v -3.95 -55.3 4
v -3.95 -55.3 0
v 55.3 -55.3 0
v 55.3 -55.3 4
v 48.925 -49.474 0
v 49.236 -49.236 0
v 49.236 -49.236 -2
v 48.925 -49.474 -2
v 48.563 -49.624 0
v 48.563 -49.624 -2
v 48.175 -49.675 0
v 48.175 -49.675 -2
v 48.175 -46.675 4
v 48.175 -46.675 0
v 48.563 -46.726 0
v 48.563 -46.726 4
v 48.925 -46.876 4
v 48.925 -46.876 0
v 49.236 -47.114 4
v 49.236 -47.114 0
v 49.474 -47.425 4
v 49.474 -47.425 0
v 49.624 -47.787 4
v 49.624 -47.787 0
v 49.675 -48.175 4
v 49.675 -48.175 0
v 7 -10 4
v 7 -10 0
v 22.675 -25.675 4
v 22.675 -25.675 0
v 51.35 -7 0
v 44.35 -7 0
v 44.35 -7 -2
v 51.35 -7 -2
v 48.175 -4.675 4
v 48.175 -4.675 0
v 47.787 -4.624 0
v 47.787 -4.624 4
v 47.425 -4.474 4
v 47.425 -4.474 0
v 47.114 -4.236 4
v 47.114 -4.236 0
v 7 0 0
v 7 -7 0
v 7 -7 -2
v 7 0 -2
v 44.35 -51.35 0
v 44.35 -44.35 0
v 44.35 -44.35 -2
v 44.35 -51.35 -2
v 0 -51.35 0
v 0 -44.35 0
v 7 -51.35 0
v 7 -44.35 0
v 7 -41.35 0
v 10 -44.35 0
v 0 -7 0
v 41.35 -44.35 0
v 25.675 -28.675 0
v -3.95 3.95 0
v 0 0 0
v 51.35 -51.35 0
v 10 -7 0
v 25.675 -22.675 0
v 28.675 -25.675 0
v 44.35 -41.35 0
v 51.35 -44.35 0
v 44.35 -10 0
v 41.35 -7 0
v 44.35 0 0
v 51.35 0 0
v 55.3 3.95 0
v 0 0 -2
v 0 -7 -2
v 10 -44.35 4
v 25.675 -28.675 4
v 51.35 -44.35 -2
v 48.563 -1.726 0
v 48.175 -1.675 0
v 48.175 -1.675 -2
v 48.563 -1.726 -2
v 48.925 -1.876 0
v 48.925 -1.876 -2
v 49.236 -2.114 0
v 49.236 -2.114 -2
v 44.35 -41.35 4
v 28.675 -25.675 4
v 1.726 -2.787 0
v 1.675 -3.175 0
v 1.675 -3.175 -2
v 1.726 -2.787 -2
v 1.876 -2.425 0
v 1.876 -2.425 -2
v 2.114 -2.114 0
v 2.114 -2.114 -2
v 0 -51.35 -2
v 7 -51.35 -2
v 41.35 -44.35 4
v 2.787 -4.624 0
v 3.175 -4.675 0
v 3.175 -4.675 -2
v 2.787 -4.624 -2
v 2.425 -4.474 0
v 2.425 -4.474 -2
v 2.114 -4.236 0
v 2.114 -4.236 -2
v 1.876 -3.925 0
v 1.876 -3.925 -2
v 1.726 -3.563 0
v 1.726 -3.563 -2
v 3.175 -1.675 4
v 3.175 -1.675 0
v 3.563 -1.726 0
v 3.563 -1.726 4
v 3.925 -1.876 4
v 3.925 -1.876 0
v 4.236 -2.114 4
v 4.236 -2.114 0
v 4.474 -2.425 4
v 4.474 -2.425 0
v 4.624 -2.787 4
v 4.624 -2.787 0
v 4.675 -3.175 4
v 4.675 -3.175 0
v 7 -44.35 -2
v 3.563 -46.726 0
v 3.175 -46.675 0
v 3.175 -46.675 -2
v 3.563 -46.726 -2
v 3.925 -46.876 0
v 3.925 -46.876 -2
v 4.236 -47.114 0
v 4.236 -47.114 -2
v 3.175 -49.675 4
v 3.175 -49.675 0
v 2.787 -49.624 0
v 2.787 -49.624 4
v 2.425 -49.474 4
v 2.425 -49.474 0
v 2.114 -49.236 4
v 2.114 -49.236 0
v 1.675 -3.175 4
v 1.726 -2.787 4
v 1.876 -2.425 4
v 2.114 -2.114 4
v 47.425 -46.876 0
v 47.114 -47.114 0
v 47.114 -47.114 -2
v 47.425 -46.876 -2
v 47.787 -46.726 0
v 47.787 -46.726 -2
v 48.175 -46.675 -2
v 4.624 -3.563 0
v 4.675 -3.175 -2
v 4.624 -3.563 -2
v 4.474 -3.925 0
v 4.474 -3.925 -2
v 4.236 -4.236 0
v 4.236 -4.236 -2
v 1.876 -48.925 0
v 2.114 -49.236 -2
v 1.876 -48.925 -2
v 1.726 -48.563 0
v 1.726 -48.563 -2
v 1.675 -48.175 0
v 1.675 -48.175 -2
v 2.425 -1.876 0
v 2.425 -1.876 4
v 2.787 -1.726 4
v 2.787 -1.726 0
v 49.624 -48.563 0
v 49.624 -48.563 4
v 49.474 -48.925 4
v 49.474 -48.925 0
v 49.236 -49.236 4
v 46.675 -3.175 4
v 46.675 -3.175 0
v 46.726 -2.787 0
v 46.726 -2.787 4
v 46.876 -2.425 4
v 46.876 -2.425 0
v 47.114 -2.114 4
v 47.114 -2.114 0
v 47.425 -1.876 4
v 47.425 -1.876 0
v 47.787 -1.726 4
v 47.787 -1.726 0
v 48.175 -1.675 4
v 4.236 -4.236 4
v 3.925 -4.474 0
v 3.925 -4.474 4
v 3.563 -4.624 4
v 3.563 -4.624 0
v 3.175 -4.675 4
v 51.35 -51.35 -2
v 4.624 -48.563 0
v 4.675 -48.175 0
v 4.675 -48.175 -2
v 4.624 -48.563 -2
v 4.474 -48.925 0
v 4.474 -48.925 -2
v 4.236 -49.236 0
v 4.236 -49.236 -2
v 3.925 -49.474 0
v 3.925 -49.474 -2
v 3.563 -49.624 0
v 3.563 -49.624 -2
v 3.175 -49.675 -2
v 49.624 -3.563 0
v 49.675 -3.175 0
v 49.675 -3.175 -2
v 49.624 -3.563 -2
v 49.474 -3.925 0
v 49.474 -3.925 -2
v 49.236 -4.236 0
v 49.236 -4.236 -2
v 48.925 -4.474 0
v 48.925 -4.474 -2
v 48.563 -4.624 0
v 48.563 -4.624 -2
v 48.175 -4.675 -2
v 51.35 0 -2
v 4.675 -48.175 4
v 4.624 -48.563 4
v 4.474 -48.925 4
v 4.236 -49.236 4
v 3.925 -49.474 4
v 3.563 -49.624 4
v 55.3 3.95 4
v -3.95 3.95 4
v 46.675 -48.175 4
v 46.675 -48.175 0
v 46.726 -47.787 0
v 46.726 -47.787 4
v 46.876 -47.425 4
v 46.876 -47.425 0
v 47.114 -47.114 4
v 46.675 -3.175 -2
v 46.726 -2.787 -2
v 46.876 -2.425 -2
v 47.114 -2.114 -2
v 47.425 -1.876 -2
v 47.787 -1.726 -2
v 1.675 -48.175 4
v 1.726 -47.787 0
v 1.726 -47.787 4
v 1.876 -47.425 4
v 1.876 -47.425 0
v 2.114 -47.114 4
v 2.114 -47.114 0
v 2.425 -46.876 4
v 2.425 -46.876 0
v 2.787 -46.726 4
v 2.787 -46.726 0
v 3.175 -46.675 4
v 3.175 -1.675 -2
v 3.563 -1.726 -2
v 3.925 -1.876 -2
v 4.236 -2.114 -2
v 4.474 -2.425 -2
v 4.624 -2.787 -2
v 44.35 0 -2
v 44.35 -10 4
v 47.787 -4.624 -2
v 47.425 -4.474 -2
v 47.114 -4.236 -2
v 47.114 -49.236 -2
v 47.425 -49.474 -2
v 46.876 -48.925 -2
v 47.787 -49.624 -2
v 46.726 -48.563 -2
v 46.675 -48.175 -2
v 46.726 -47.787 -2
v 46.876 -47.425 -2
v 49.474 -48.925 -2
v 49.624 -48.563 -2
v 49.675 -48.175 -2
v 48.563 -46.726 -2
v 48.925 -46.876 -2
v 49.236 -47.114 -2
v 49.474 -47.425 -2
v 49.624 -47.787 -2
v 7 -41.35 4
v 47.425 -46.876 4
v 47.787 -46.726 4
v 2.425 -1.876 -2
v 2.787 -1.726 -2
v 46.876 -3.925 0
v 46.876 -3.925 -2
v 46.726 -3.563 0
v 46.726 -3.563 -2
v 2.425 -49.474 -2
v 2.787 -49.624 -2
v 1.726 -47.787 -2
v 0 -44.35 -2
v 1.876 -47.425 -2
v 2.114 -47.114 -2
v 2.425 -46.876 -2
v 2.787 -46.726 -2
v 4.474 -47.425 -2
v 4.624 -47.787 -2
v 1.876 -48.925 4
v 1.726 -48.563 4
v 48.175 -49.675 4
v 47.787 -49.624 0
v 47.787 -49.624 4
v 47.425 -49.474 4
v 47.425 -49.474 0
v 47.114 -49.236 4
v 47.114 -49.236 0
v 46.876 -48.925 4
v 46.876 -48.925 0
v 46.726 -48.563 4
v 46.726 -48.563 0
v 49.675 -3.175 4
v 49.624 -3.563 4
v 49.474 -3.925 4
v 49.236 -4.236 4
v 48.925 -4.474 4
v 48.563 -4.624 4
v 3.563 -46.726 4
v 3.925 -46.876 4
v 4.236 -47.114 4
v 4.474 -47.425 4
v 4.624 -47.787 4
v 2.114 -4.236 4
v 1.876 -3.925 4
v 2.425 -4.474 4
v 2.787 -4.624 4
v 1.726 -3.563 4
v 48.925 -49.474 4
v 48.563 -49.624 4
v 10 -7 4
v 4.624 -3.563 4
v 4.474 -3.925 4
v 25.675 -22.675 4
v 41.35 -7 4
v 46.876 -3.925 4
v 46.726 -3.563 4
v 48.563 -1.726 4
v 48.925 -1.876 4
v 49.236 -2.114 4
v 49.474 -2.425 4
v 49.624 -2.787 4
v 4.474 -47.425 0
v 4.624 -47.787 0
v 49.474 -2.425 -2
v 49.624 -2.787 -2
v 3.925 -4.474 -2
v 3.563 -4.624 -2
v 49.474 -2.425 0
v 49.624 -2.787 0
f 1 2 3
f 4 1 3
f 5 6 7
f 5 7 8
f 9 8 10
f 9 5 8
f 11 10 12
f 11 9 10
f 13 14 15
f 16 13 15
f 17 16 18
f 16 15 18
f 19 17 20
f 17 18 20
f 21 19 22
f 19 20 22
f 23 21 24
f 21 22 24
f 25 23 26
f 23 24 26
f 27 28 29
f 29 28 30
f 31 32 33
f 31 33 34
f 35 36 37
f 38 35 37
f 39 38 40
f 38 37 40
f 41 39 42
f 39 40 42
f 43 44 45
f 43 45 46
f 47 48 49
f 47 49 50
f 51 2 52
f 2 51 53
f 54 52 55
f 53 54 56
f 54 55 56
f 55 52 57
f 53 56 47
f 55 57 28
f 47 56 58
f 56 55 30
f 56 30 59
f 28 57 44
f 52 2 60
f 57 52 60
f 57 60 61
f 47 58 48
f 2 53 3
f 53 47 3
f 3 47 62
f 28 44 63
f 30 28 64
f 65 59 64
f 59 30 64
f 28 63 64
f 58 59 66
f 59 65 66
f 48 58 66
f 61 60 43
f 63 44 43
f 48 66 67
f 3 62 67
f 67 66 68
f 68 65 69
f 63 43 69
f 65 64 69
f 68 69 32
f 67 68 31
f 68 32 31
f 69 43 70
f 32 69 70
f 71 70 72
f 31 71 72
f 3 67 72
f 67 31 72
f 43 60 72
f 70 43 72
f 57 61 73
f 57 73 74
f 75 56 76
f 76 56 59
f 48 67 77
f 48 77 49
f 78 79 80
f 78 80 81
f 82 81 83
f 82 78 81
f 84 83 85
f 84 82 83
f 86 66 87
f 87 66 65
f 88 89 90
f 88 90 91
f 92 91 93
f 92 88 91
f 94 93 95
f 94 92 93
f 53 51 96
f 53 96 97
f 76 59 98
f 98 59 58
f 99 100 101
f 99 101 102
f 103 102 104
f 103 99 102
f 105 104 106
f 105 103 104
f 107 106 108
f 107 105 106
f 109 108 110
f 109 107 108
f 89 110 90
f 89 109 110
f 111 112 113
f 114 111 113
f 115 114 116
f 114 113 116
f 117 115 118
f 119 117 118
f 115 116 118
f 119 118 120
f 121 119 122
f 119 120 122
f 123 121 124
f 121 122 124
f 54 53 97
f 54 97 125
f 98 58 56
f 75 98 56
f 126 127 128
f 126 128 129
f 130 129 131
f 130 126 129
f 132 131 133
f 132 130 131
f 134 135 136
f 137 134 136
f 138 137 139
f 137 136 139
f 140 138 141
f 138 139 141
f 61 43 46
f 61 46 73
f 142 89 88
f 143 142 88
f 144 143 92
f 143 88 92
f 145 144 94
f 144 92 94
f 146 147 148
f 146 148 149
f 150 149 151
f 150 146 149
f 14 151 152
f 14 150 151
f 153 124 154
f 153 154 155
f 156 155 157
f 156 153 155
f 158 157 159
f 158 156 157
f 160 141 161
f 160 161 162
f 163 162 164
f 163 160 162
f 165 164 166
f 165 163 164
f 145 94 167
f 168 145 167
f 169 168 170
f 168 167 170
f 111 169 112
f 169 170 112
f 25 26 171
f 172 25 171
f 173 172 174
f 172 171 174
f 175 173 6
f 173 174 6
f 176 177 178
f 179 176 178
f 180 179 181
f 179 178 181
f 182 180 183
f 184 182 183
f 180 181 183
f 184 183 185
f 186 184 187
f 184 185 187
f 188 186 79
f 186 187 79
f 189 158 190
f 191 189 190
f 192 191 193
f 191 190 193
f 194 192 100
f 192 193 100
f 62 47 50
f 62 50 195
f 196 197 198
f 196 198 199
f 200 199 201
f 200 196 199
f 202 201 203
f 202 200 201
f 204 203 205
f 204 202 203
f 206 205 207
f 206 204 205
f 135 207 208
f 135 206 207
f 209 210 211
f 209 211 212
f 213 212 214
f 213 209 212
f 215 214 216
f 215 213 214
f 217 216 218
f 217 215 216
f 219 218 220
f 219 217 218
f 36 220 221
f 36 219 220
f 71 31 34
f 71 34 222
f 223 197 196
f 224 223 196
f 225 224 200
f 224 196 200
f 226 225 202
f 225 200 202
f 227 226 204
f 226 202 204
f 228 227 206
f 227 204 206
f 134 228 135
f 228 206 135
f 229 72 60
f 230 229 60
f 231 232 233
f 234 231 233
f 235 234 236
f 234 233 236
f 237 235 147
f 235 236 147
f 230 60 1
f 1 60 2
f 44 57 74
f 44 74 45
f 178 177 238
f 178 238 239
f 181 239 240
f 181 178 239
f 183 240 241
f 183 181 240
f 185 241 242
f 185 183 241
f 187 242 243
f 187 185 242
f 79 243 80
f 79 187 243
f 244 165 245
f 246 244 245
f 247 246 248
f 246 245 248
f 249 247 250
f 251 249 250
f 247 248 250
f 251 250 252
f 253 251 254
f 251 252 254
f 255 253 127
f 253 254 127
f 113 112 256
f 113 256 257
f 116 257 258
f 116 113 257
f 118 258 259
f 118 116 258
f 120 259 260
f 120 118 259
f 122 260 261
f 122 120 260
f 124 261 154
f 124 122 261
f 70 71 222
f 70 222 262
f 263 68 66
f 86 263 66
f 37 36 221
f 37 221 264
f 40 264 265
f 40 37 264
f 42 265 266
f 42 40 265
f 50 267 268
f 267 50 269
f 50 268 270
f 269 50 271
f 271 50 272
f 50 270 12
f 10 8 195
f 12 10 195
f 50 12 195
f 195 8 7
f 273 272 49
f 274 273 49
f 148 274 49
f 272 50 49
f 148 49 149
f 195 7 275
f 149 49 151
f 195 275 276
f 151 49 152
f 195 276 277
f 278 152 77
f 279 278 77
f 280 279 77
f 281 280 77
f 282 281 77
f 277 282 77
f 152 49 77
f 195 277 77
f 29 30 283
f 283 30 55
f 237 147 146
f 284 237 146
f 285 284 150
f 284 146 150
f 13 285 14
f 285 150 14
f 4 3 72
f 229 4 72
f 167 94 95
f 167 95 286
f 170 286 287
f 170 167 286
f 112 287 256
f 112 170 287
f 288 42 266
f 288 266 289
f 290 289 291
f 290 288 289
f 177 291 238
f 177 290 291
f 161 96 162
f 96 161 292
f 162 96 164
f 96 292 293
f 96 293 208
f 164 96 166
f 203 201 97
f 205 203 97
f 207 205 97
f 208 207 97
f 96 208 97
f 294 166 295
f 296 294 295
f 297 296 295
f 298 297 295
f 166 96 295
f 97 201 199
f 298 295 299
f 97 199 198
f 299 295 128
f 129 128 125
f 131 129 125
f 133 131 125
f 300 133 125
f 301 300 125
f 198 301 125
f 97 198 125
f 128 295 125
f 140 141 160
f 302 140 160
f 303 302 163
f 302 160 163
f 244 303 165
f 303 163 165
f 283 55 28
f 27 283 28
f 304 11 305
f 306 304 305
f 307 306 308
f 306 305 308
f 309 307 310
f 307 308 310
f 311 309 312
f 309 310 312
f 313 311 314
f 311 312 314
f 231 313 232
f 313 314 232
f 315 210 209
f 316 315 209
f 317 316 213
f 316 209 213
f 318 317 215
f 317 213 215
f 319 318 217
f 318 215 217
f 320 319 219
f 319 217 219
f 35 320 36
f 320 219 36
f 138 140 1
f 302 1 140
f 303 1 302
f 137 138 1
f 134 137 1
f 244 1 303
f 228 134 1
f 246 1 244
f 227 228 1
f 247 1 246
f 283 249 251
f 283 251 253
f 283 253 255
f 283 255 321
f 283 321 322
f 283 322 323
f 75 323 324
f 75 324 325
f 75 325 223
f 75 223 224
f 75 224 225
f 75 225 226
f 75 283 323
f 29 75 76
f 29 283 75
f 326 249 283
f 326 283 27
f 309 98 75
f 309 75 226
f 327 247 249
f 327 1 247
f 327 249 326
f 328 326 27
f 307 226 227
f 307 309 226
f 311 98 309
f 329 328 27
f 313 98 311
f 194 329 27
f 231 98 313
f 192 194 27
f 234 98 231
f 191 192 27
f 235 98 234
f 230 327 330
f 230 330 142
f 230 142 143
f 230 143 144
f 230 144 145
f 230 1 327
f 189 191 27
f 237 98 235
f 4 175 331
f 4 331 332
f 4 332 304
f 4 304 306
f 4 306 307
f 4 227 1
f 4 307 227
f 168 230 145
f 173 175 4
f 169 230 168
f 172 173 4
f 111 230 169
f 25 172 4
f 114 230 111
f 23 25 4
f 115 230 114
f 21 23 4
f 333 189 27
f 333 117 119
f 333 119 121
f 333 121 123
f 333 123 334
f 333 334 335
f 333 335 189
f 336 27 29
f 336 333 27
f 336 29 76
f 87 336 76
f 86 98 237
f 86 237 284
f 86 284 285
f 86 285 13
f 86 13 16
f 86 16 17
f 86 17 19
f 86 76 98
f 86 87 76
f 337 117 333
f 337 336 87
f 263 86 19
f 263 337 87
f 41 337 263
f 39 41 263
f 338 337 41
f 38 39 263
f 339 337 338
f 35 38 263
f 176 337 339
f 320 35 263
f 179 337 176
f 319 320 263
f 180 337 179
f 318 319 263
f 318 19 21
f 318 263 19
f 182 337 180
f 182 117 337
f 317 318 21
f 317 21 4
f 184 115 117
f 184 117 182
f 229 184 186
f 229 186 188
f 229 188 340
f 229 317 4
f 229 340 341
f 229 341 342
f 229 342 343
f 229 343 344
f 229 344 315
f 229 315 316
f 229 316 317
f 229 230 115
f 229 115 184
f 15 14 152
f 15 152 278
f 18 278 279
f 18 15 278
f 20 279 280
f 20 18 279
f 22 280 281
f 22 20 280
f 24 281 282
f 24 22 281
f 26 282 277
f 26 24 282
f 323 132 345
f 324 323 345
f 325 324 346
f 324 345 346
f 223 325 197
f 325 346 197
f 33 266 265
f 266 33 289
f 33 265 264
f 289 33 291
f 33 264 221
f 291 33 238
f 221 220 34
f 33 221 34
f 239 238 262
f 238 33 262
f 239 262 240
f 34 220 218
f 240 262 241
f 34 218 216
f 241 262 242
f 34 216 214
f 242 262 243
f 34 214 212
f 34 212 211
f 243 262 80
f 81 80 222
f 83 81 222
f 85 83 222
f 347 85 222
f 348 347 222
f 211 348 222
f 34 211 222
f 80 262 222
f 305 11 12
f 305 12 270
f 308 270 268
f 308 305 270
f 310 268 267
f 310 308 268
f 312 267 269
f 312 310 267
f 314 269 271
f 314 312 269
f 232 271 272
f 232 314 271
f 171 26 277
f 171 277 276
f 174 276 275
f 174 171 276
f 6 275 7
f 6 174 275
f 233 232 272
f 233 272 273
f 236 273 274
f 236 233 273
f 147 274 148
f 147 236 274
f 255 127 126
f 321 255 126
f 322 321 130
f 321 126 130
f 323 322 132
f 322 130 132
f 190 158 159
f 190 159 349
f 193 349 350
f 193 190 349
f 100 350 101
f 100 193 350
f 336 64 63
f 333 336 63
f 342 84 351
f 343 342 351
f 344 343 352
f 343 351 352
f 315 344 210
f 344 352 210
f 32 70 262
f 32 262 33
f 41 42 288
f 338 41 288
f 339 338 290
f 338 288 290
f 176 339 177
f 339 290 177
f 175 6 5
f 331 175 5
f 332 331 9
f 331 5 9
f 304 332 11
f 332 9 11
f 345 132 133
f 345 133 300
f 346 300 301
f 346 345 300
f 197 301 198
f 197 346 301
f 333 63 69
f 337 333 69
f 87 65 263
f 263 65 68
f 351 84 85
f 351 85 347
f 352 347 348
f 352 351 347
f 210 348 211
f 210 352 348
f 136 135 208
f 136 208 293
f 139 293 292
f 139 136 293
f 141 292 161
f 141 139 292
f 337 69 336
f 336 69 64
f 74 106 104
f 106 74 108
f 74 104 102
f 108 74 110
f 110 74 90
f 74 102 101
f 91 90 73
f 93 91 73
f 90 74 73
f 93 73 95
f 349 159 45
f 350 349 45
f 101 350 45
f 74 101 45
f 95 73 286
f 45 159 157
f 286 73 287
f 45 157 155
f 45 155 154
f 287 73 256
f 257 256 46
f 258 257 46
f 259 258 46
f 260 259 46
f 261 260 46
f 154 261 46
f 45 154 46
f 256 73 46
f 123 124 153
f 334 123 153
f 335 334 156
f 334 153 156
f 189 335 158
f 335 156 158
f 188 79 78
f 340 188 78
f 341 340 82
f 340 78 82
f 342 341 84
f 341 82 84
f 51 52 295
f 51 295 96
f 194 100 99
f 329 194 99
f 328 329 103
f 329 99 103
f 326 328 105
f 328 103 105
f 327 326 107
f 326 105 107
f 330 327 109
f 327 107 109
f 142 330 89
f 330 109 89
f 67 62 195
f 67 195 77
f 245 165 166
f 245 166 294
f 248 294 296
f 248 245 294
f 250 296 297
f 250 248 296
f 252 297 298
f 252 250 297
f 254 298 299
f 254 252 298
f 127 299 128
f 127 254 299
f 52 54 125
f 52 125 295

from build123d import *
from build123d import SkipClean  # not in build123d's __all__

# Parameters (mm, degrees)
F0_W     = 3.175
F0_H     = 37.35
F0_W_2   = 37.35
F0_H_2   = 3.175
F1_DEPTH = 4
F2_DEPTH = 2


# Not quite as in the source:
# - a feature names something its author has since deleted; it is built from what else it names


with BuildPart() as f1:
    # F0 (on Top) → F1 (new body)
    with BuildSketch(Plane.XY):
        Polygon((0, -51.35), (-3.95, -55.3), (55.3, -55.3), (51.35, -51.35), (48.175, -51.35), (44.35, -51.35), (7, -51.35), (3.175, -51.35), align=None)
        with Locations((1.5875, -25.675)):
            Rectangle(F0_W, F0_H)
        with Locations((25.675, -49.7625)):
            Rectangle(F0_W_2, F0_H_2)
        with BuildLine():
            Line((3.175, -44.35), (0, -44.35))
            Line((0, -44.35), (0, -48.175))
            Line((0, -48.175), (1.675, -48.175))
            ThreePointArc((1.675, -48.175), (2.1143398282, -47.1143398282), (3.175, -46.675))
            Line((3.175, -46.675), (3.175, -44.35))
        make_face()
        with BuildLine():
            Line((7, -44.35), (3.175, -44.35))
            Line((3.175, -44.35), (3.175, -46.675))
            ThreePointArc((3.175, -46.675), (3.7490251485, -46.7891807012), (4.2356601718, -47.1143398282))
            Line((4.2356601718, -47.1143398282), (7, -44.35))
        make_face()
        with BuildLine():
            Line((2.1143398282, -49.2356601718), (0, -51.35))
            Line((0, -51.35), (3.175, -51.35))
            Line((3.175, -51.35), (3.175, -49.675))
            ThreePointArc((3.175, -49.675), (2.6009748515, -49.5608192988), (2.1143398282, -49.2356601718))
        make_face()
        Polygon((0, -3.175), (0, 0), (-3.95, 3.95), (-3.95, -55.3), (0, -51.35), (0, -48.175), (0, -44.35), (0, -7), align=None)
        Polygon((-3.95, 3.95), (0, 0), (3.175, 0), (7, 0), (44.35, 0), (48.175, 0), (51.35, 0), (55.3, 3.95), align=None)
        with Locations((25.675, -1.5875)):
            Rectangle(F0_W_2, F0_H_2)
        Polygon((55.3, -55.3), (55.3, 3.95), (51.35, 0), (51.35, -3.175), (51.35, -7), (51.35, -44.35), (51.35, -48.175), (51.35, -51.35), align=None)
        with Locations((49.7625, -25.675)):
            Rectangle(F0_W, F0_H)
        with BuildLine():
            Line((49.2356601718, -49.2356601718), (51.35, -51.35))
            Line((51.35, -51.35), (51.35, -48.175))
            Line((51.35, -48.175), (49.675, -48.175))
            ThreePointArc((49.675, -48.175), (49.5608192988, -48.7490251485), (49.2356601718, -49.2356601718))
        make_face()
        with BuildLine():
            Line((49.675, -48.175), (51.35, -48.175))
            Line((51.35, -48.175), (51.35, -44.35))
            Line((51.35, -44.35), (48.175, -44.35))
            Line((48.175, -44.35), (48.175, -46.675))
            ThreePointArc((48.175, -46.675), (49.2356601718, -47.1143398282), (49.675, -48.175))
        make_face()
        with BuildLine():
            Line((48.175, -46.675), (48.175, -44.35))
            Line((48.175, -44.35), (44.35, -44.35))
            Line((44.35, -44.35), (47.1143398282, -47.1143398282))
            ThreePointArc((47.1143398282, -47.1143398282), (47.6009748515, -46.7891807012), (48.175, -46.675))
        make_face()
        Polygon((7, -41.3499998236), (7, -44.35), (8.5000000882, -42.8499999118), align=None)
        Polygon((8.5000000882, -42.8499999118), (7, -44.35), (10.0000001764, -44.35), align=None)
        Polygon((8.5000000882, -42.8499999118), (10.0000001764, -44.35), (25.6750000882, -28.6750000882), (24.175, -27.175), align=None)
        Polygon((22.6749999118, -25.6749999118), (7, -41.3499998236), (8.5000000882, -42.8499999118), (24.175, -27.175), align=None)
        Polygon((8.5, -8.5), (7, -10), (22.6749999118, -25.6749999118), (24.1749999118, -24.1749999118), align=None)
        Polygon((25.6749999118, -22.6749999118), (10, -7), (8.5, -8.5), (24.1749999118, -24.1749999118), align=None)
        Polygon((27.175, -24.175), (25.6749999118, -22.6749999118), (24.1749999118, -24.1749999118), (25.675, -25.675), align=None)
        Polygon((27.1750000882, -27.1750000882), (28.6750000882, -25.6750000882), (27.175, -24.175), (25.675, -25.675), align=None)
        Polygon((25.675, -25.675), (24.175, -27.175), (25.6750000882, -28.6750000882), (27.1750000882, -27.1750000882), align=None)
        Polygon((24.1749999118, -24.1749999118), (22.6749999118, -25.6749999118), (24.175, -27.175), (25.675, -25.675), align=None)
        Polygon((25.6750000882, -28.6750000882), (41.35, -44.35), (42.85, -42.85), (27.1750000882, -27.1750000882), align=None)
        Polygon((42.85, -42.85), (44.35, -41.35), (28.6750000882, -25.6750000882), (27.1750000882, -27.1750000882), align=None)
        Polygon((8.5, -8.5), (7, -7), (7, -10), align=None)
        Polygon((10, -7), (7, -7), (8.5, -8.5), align=None)
        Polygon((28.6750000882, -25.6750000882), (44.35, -10.0000001764), (42.8499999118, -8.5000000882), (27.175, -24.175), align=None)
        Polygon((42.8499999118, -8.5000000882), (41.3499998236, -7), (25.6749999118, -22.6749999118), (27.175, -24.175), align=None)
        Polygon((44.35, -10.0000001764), (44.35, -7), (42.8499999118, -8.5000000882), align=None)
        Polygon((44.35, -44.35), (44.35, -41.35), (42.85, -42.85), align=None)
        Polygon((42.85, -42.85), (41.35, -44.35), (44.35, -44.35), align=None)
        Polygon((42.8499999118, -8.5000000882), (44.35, -7), (41.3499998236, -7), align=None)
        with BuildLine():
            Line((0, -48.175), (0, -51.35))
            Line((0, -51.35), (2.1143398282, -49.2356601718))
            ThreePointArc((2.1143398282, -49.2356601718), (1.7891807012, -48.7490251485), (1.675, -48.175))
            Line((1.675, -48.175), (0, -48.175))
        make_face()
        with BuildLine():
            Line((3.175, -49.675), (3.175, -51.35))
            Line((3.175, -51.35), (7, -51.35))
            Line((7, -51.35), (7, -48.175))
            Line((7, -48.175), (4.675, -48.175))
            ThreePointArc((4.675, -48.175), (4.2356601718, -49.2356601718), (3.175, -49.675))
        make_face()
        with BuildLine():
            Line((7, -48.175), (7, -44.35))
            Line((7, -44.35), (4.2356601718, -47.1143398282))
            ThreePointArc((4.2356601718, -47.1143398282), (4.5608192988, -47.6009748515), (4.675, -48.175))
            Line((4.675, -48.175), (7, -48.175))
        make_face()
        with BuildLine():
            Line((44.35, -51.35), (48.175, -51.35))
            Line((48.175, -51.35), (48.175, -49.675))
            ThreePointArc((48.175, -49.675), (47.1143398282, -49.2356601718), (46.675, -48.175))
            Line((46.675, -48.175), (44.35, -48.175))
            Line((44.35, -48.175), (44.35, -51.35))
        make_face()
        with BuildLine():
            Line((44.35, -44.35), (44.35, -48.175))
            Line((44.35, -48.175), (46.675, -48.175))
            ThreePointArc((46.675, -48.175), (46.7891807012, -47.6009748515), (47.1143398282, -47.1143398282))
            Line((47.1143398282, -47.1143398282), (44.35, -44.35))
        make_face()
        with BuildLine():
            Line((48.175, -51.35), (51.35, -51.35))
            Line((51.35, -51.35), (49.2356601718, -49.2356601718))
            ThreePointArc((49.2356601718, -49.2356601718), (48.7490251485, -49.5608192988), (48.175, -49.675))
            Line((48.175, -49.675), (48.175, -51.35))
        make_face()
        with BuildLine():
            Line((48.175, 0), (44.35, 0))
            Line((44.35, 0), (44.35, -3.175))
            Line((44.35, -3.175), (46.675, -3.175))
            ThreePointArc((46.675, -3.175), (47.1143398282, -2.1143398282), (48.175, -1.675))
            Line((48.175, -1.675), (48.175, 0))
        make_face()
        with BuildLine():
            Line((46.675, -3.175), (44.35, -3.175))
            Line((44.35, -3.175), (44.35, -7))
            Line((44.35, -7), (47.1143398282, -4.2356601718))
            ThreePointArc((47.1143398282, -4.2356601718), (46.7891807012, -3.7490251485), (46.675, -3.175))
        make_face()
        with BuildLine():
            Line((49.2356601718, -2.1143398282), (51.35, 0))
            Line((51.35, 0), (48.175, 0))
            Line((48.175, 0), (48.175, -1.675))
            ThreePointArc((48.175, -1.675), (48.7490251485, -1.7891807012), (49.2356601718, -2.1143398282))
        make_face()
        with BuildLine():
            Line((7, 0), (3.175, 0))
            Line((3.175, 0), (3.175, -1.675))
            ThreePointArc((3.175, -1.675), (4.2356601718, -2.1143398282), (4.675, -3.175))
            Line((4.675, -3.175), (7, -3.175))
            Line((7, -3.175), (7, 0))
        make_face()
        with BuildLine():
            Line((7, -7), (7, -3.175))
            Line((7, -3.175), (4.675, -3.175))
            ThreePointArc((4.675, -3.175), (4.5608192988, -3.7490251485), (4.2356601718, -4.2356601718))
            Line((4.2356601718, -4.2356601718), (7, -7))
        make_face()
        with BuildLine():
            Line((3.175, -4.675), (3.175, -7))
            Line((3.175, -7), (7, -7))
            Line((7, -7), (4.2356601718, -4.2356601718))
            ThreePointArc((4.2356601718, -4.2356601718), (3.7490251485, -4.5608192988), (3.175, -4.675))
        make_face()
        with BuildLine():
            Line((1.675, -3.175), (0, -3.175))
            Line((0, -3.175), (0, -7))
            Line((0, -7), (3.175, -7))
            Line((3.175, -7), (3.175, -4.675))
            ThreePointArc((3.175, -4.675), (2.1143398282, -4.2356601718), (1.675, -3.175))
        make_face()
        with BuildLine():
            Line((2.1143398282, -2.1143398282), (0, 0))
            Line((0, 0), (0, -3.175))
            Line((0, -3.175), (1.675, -3.175))
            ThreePointArc((1.675, -3.175), (1.7891807012, -2.6009748515), (2.1143398282, -2.1143398282))
        make_face()
        Polygon((44.35, -3.175), (7, -3.175), (7, -7), (10, -7), (41.3499998236, -7), (44.35, -7), align=None)
        Polygon((7, -7), (3.175, -7), (3.175, -44.35), (7, -44.35), (7, -41.3499998236), (7, -10), align=None)
        with BuildLine():
            Line((51.35, -3.175), (51.35, 0))
            Line((51.35, 0), (49.2356601718, -2.1143398282))
            ThreePointArc((49.2356601718, -2.1143398282), (49.5608192988, -2.6009748515), (49.675, -3.175))
            Line((49.675, -3.175), (51.35, -3.175))
        make_face()
        with BuildLine():
            Line((51.35, -7), (51.35, -3.175))
            Line((51.35, -3.175), (49.675, -3.175))
            ThreePointArc((49.675, -3.175), (49.2356601718, -4.2356601718), (48.175, -4.675))
            Line((48.175, -4.675), (48.175, -7))
            Line((48.175, -7), (51.35, -7))
        make_face()
        with BuildLine():
            Line((47.1143398282, -4.2356601718), (44.35, -7))
            Line((44.35, -7), (48.175, -7))
            Line((48.175, -7), (48.175, -4.675))
            ThreePointArc((48.175, -4.675), (47.6009748515, -4.5608192988), (47.1143398282, -4.2356601718))
        make_face()
        Polygon((48.175, -7), (44.35, -7), (44.35, -10.0000001764), (44.35, -41.35), (44.35, -44.35), (48.175, -44.35), align=None)
        Polygon((10.0000001764, -44.35), (7, -44.35), (7, -48.175), (44.35, -48.175), (44.35, -44.35), (41.35, -44.35), align=None)
        with BuildLine():
            Line((3.175, 0), (0, 0))
            Line((0, 0), (2.1143398282, -2.1143398282))
            ThreePointArc((2.1143398282, -2.1143398282), (2.6009748515, -1.7891807012), (3.175, -1.675))
            Line((3.175, -1.675), (3.175, 0))
        make_face()
    extrude(amount=F1_DEPTH)

    # F0 (on Top) → F2 (join)
    with BuildSketch(Plane.XY):
        with BuildLine():
            Line((3.175, -44.35), (0, -44.35))
            Line((0, -44.35), (0, -48.175))
            Line((0, -48.175), (1.675, -48.175))
            ThreePointArc((1.675, -48.175), (2.1143398282, -47.1143398282), (3.175, -46.675))
            Line((3.175, -46.675), (3.175, -44.35))
        make_face()
        with BuildLine():
            Line((7, -44.35), (3.175, -44.35))
            Line((3.175, -44.35), (3.175, -46.675))
            ThreePointArc((3.175, -46.675), (3.7490251485, -46.7891807012), (4.2356601718, -47.1143398282))
            Line((4.2356601718, -47.1143398282), (7, -44.35))
        make_face()
        with BuildLine():
            Line((2.1143398282, -49.2356601718), (0, -51.35))
            Line((0, -51.35), (3.175, -51.35))
            Line((3.175, -51.35), (3.175, -49.675))
            ThreePointArc((3.175, -49.675), (2.6009748515, -49.5608192988), (2.1143398282, -49.2356601718))
        make_face()
        with BuildLine():
            Line((49.675, -48.175), (51.35, -48.175))
            Line((51.35, -48.175), (51.35, -44.35))
            Line((51.35, -44.35), (48.175, -44.35))
            Line((48.175, -44.35), (48.175, -46.675))
            ThreePointArc((48.175, -46.675), (49.2356601718, -47.1143398282), (49.675, -48.175))
        make_face()
        with BuildLine():
            Line((48.175, -46.675), (48.175, -44.35))
            Line((48.175, -44.35), (44.35, -44.35))
            Line((44.35, -44.35), (47.1143398282, -47.1143398282))
            ThreePointArc((47.1143398282, -47.1143398282), (47.6009748515, -46.7891807012), (48.175, -46.675))
        make_face()
        with BuildLine():
            Line((49.2356601718, -49.2356601718), (51.35, -51.35))
            Line((51.35, -51.35), (51.35, -48.175))
            Line((51.35, -48.175), (49.675, -48.175))
            ThreePointArc((49.675, -48.175), (49.5608192988, -48.7490251485), (49.2356601718, -49.2356601718))
        make_face()
        with BuildLine():
            Line((3.175, -49.675), (3.175, -51.35))
            Line((3.175, -51.35), (7, -51.35))
            Line((7, -51.35), (7, -48.175))
            Line((7, -48.175), (4.675, -48.175))
            ThreePointArc((4.675, -48.175), (4.2356601718, -49.2356601718), (3.175, -49.675))
        make_face()
        with BuildLine():
            Line((7, -48.175), (7, -44.35))
            Line((7, -44.35), (4.2356601718, -47.1143398282))
            ThreePointArc((4.2356601718, -47.1143398282), (4.5608192988, -47.6009748515), (4.675, -48.175))
            Line((4.675, -48.175), (7, -48.175))
        make_face()
        with BuildLine():
            Line((0, -48.175), (0, -51.35))
            Line((0, -51.35), (2.1143398282, -49.2356601718))
            ThreePointArc((2.1143398282, -49.2356601718), (1.7891807012, -48.7490251485), (1.675, -48.175))
            Line((1.675, -48.175), (0, -48.175))
        make_face()
        with BuildLine():
            Line((44.35, -51.35), (48.175, -51.35))
            Line((48.175, -51.35), (48.175, -49.675))
            ThreePointArc((48.175, -49.675), (47.1143398282, -49.2356601718), (46.675, -48.175))
            Line((46.675, -48.175), (44.35, -48.175))
            Line((44.35, -48.175), (44.35, -51.35))
        make_face()
        with BuildLine():
            Line((44.35, -44.35), (44.35, -48.175))
            Line((44.35, -48.175), (46.675, -48.175))
            ThreePointArc((46.675, -48.175), (46.7891807012, -47.6009748515), (47.1143398282, -47.1143398282))
            Line((47.1143398282, -47.1143398282), (44.35, -44.35))
        make_face()
        with BuildLine():
            Line((48.175, -51.35), (51.35, -51.35))
            Line((51.35, -51.35), (49.2356601718, -49.2356601718))
            ThreePointArc((49.2356601718, -49.2356601718), (48.7490251485, -49.5608192988), (48.175, -49.675))
            Line((48.175, -49.675), (48.175, -51.35))
        make_face()
        with BuildLine():
            Line((48.175, 0), (44.35, 0))
            Line((44.35, 0), (44.35, -3.175))
            Line((44.35, -3.175), (46.675, -3.175))
            ThreePointArc((46.675, -3.175), (47.1143398282, -2.1143398282), (48.175, -1.675))
            Line((48.175, -1.675), (48.175, 0))
        make_face()
        with BuildLine():
            Line((46.675, -3.175), (44.35, -3.175))
            Line((44.35, -3.175), (44.35, -7))
            Line((44.35, -7), (47.1143398282, -4.2356601718))
            ThreePointArc((47.1143398282, -4.2356601718), (46.7891807012, -3.7490251485), (46.675, -3.175))
        make_face()
        with BuildLine():
            Line((49.2356601718, -2.1143398282), (51.35, 0))
            Line((51.35, 0), (48.175, 0))
            Line((48.175, 0), (48.175, -1.675))
            ThreePointArc((48.175, -1.675), (48.7490251485, -1.7891807012), (49.2356601718, -2.1143398282))
        make_face()
        with BuildLine():
            Line((1.675, -3.175), (0, -3.175))
            Line((0, -3.175), (0, -7))
            Line((0, -7), (3.175, -7))
            Line((3.175, -7), (3.175, -4.675))
            ThreePointArc((3.175, -4.675), (2.1143398282, -4.2356601718), (1.675, -3.175))
        make_face()
        with BuildLine():
            Line((3.175, -4.675), (3.175, -7))
            Line((3.175, -7), (7, -7))
            Line((7, -7), (4.2356601718, -4.2356601718))
            ThreePointArc((4.2356601718, -4.2356601718), (3.7490251485, -4.5608192988), (3.175, -4.675))
        make_face()
        with BuildLine():
            Line((7, -7), (7, -3.175))
            Line((7, -3.175), (4.675, -3.175))
            ThreePointArc((4.675, -3.175), (4.5608192988, -3.7490251485), (4.2356601718, -4.2356601718))
            Line((4.2356601718, -4.2356601718), (7, -7))
        make_face()
        with BuildLine():
            Line((3.175, 0), (0, 0))
            Line((0, 0), (2.1143398282, -2.1143398282))
            ThreePointArc((2.1143398282, -2.1143398282), (2.6009748515, -1.7891807012), (3.175, -1.675))
            Line((3.175, -1.675), (3.175, 0))
        make_face()
        with BuildLine():
            Line((2.1143398282, -2.1143398282), (0, 0))
            Line((0, 0), (0, -3.175))
            Line((0, -3.175), (1.675, -3.175))
            ThreePointArc((1.675, -3.175), (1.7891807012, -2.6009748515), (2.1143398282, -2.1143398282))
        make_face()
        with BuildLine():
            Line((7, 0), (3.175, 0))
            Line((3.175, 0), (3.175, -1.675))
            ThreePointArc((3.175, -1.675), (4.2356601718, -2.1143398282), (4.675, -3.175))
            Line((4.675, -3.175), (7, -3.175))
            Line((7, -3.175), (7, 0))
        make_face()
        with BuildLine():
            Line((51.35, -3.175), (51.35, 0))
            Line((51.35, 0), (49.2356601718, -2.1143398282))
            ThreePointArc((49.2356601718, -2.1143398282), (49.5608192988, -2.6009748515), (49.675, -3.175))
            Line((49.675, -3.175), (51.35, -3.175))
        make_face()
        with BuildLine():
            Line((51.35, -7), (51.35, -3.175))
            Line((51.35, -3.175), (49.675, -3.175))
            ThreePointArc((49.675, -3.175), (49.2356601718, -4.2356601718), (48.175, -4.675))
            Line((48.175, -4.675), (48.175, -7))
            Line((48.175, -7), (51.35, -7))
        make_face()
        with BuildLine():
            Line((47.1143398282, -4.2356601718), (44.35, -7))
            Line((44.35, -7), (48.175, -7))
            Line((48.175, -7), (48.175, -4.675))
            ThreePointArc((48.175, -4.675), (47.6009748515, -4.5608192988), (47.1143398282, -4.2356601718))
        make_face()
    with SkipClean():  # cleaning this boolean's faces spoils the solid; the shape is the same uncleaned
        extrude(amount=-F2_DEPTH)


solid = f1.part
